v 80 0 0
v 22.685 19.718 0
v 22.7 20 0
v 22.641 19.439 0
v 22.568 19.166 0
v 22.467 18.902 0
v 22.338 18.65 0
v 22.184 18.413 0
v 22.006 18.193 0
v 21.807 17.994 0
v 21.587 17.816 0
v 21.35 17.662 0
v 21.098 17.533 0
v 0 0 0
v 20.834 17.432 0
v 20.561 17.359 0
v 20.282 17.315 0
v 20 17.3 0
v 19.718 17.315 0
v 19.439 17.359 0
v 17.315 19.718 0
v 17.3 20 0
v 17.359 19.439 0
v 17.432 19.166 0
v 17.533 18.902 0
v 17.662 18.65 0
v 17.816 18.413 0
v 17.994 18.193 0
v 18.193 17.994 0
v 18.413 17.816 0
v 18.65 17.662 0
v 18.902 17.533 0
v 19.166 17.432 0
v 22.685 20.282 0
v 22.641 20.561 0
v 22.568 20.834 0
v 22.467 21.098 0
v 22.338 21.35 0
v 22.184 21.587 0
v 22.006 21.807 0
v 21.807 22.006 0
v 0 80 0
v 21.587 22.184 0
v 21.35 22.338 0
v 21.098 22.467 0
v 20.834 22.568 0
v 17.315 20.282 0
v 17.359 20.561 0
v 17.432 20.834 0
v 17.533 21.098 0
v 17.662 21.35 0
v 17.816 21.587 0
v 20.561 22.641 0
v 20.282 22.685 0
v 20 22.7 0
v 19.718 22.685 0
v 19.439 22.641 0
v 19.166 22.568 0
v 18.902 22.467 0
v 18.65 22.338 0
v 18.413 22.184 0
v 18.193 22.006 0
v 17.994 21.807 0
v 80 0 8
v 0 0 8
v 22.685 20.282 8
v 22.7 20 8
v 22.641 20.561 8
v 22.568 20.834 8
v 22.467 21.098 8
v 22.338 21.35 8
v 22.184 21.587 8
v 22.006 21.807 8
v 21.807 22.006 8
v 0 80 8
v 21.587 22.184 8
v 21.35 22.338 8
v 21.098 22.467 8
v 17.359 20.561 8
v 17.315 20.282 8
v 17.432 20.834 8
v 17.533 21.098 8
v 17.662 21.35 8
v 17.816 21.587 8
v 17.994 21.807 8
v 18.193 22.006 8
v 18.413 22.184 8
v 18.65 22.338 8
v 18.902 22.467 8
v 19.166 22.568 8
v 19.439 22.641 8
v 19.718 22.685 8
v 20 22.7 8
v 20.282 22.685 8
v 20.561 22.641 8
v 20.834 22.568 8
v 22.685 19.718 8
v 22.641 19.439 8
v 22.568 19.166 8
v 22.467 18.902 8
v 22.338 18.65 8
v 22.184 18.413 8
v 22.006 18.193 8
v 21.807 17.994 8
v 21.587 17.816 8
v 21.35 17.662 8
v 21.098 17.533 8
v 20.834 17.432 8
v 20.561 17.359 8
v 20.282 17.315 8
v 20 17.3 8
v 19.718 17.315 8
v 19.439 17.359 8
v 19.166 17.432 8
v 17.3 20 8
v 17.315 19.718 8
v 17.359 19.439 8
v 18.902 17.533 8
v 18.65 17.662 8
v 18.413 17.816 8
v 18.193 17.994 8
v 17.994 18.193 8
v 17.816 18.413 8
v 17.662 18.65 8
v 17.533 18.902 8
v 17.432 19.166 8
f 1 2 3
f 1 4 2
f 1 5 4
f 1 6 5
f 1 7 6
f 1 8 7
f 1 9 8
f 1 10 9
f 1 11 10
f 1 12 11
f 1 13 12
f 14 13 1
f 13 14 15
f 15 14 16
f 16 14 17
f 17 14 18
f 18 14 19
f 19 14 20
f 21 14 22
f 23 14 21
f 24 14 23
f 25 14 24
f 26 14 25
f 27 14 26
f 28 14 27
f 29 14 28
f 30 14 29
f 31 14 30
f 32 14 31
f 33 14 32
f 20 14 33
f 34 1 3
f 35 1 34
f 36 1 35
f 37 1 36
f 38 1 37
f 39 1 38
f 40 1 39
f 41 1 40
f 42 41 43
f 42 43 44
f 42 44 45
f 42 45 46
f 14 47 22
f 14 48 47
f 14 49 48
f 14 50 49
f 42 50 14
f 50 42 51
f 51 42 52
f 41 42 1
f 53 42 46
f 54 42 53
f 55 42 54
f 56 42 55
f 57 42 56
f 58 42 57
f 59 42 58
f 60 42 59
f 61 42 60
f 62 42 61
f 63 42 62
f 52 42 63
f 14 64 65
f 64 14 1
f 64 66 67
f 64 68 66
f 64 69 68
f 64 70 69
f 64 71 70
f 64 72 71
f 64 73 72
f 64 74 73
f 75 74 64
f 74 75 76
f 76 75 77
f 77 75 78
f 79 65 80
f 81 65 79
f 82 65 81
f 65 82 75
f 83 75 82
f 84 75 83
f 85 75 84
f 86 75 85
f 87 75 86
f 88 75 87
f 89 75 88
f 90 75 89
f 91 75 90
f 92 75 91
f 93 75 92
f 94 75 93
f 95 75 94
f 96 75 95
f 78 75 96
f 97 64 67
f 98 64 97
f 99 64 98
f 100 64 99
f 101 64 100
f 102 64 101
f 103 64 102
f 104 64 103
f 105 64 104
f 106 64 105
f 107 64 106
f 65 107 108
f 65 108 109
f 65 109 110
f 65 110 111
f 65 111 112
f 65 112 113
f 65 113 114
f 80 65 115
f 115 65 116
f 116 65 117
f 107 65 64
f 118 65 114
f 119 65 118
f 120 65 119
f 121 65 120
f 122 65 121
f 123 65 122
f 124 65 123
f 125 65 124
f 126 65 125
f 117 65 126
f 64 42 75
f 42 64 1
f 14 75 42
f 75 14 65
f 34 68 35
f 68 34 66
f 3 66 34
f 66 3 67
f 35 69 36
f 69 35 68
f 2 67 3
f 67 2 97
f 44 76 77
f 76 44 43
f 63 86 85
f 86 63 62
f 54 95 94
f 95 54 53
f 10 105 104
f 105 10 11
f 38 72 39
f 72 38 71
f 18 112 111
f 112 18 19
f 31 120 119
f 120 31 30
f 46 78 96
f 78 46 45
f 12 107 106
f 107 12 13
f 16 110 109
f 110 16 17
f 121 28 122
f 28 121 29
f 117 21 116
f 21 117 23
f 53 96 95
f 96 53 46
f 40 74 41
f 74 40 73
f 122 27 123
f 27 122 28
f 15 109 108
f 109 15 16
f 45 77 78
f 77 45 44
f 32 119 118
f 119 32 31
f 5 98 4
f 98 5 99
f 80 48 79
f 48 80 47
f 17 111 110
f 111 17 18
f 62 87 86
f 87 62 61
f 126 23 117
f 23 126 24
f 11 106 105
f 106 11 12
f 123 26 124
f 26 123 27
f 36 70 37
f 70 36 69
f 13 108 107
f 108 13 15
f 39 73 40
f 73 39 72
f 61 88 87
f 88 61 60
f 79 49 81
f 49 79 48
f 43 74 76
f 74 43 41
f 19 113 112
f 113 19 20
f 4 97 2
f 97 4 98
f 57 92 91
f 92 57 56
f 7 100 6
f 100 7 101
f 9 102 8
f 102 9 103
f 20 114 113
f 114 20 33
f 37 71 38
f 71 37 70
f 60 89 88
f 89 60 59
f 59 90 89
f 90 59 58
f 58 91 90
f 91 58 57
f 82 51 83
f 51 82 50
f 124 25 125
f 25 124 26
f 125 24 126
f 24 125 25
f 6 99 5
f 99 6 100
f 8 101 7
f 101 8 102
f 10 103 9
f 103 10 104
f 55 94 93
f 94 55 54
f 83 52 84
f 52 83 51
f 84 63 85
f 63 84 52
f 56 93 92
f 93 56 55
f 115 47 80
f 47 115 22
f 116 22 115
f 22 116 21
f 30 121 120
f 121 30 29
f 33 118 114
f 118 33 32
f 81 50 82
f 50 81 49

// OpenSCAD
// Triangular reinforcement gusset.
$fn = 60;
eps = 0.02;
leg = 80;
thickness = 8;
difference() {
    linear_extrude(height=thickness) polygon(points=[[0,0],[leg,0],[0,leg]]);
    translate([leg*0.25,leg*0.25,-eps]) cylinder(d=5.4,h=thickness+2*eps);
}
